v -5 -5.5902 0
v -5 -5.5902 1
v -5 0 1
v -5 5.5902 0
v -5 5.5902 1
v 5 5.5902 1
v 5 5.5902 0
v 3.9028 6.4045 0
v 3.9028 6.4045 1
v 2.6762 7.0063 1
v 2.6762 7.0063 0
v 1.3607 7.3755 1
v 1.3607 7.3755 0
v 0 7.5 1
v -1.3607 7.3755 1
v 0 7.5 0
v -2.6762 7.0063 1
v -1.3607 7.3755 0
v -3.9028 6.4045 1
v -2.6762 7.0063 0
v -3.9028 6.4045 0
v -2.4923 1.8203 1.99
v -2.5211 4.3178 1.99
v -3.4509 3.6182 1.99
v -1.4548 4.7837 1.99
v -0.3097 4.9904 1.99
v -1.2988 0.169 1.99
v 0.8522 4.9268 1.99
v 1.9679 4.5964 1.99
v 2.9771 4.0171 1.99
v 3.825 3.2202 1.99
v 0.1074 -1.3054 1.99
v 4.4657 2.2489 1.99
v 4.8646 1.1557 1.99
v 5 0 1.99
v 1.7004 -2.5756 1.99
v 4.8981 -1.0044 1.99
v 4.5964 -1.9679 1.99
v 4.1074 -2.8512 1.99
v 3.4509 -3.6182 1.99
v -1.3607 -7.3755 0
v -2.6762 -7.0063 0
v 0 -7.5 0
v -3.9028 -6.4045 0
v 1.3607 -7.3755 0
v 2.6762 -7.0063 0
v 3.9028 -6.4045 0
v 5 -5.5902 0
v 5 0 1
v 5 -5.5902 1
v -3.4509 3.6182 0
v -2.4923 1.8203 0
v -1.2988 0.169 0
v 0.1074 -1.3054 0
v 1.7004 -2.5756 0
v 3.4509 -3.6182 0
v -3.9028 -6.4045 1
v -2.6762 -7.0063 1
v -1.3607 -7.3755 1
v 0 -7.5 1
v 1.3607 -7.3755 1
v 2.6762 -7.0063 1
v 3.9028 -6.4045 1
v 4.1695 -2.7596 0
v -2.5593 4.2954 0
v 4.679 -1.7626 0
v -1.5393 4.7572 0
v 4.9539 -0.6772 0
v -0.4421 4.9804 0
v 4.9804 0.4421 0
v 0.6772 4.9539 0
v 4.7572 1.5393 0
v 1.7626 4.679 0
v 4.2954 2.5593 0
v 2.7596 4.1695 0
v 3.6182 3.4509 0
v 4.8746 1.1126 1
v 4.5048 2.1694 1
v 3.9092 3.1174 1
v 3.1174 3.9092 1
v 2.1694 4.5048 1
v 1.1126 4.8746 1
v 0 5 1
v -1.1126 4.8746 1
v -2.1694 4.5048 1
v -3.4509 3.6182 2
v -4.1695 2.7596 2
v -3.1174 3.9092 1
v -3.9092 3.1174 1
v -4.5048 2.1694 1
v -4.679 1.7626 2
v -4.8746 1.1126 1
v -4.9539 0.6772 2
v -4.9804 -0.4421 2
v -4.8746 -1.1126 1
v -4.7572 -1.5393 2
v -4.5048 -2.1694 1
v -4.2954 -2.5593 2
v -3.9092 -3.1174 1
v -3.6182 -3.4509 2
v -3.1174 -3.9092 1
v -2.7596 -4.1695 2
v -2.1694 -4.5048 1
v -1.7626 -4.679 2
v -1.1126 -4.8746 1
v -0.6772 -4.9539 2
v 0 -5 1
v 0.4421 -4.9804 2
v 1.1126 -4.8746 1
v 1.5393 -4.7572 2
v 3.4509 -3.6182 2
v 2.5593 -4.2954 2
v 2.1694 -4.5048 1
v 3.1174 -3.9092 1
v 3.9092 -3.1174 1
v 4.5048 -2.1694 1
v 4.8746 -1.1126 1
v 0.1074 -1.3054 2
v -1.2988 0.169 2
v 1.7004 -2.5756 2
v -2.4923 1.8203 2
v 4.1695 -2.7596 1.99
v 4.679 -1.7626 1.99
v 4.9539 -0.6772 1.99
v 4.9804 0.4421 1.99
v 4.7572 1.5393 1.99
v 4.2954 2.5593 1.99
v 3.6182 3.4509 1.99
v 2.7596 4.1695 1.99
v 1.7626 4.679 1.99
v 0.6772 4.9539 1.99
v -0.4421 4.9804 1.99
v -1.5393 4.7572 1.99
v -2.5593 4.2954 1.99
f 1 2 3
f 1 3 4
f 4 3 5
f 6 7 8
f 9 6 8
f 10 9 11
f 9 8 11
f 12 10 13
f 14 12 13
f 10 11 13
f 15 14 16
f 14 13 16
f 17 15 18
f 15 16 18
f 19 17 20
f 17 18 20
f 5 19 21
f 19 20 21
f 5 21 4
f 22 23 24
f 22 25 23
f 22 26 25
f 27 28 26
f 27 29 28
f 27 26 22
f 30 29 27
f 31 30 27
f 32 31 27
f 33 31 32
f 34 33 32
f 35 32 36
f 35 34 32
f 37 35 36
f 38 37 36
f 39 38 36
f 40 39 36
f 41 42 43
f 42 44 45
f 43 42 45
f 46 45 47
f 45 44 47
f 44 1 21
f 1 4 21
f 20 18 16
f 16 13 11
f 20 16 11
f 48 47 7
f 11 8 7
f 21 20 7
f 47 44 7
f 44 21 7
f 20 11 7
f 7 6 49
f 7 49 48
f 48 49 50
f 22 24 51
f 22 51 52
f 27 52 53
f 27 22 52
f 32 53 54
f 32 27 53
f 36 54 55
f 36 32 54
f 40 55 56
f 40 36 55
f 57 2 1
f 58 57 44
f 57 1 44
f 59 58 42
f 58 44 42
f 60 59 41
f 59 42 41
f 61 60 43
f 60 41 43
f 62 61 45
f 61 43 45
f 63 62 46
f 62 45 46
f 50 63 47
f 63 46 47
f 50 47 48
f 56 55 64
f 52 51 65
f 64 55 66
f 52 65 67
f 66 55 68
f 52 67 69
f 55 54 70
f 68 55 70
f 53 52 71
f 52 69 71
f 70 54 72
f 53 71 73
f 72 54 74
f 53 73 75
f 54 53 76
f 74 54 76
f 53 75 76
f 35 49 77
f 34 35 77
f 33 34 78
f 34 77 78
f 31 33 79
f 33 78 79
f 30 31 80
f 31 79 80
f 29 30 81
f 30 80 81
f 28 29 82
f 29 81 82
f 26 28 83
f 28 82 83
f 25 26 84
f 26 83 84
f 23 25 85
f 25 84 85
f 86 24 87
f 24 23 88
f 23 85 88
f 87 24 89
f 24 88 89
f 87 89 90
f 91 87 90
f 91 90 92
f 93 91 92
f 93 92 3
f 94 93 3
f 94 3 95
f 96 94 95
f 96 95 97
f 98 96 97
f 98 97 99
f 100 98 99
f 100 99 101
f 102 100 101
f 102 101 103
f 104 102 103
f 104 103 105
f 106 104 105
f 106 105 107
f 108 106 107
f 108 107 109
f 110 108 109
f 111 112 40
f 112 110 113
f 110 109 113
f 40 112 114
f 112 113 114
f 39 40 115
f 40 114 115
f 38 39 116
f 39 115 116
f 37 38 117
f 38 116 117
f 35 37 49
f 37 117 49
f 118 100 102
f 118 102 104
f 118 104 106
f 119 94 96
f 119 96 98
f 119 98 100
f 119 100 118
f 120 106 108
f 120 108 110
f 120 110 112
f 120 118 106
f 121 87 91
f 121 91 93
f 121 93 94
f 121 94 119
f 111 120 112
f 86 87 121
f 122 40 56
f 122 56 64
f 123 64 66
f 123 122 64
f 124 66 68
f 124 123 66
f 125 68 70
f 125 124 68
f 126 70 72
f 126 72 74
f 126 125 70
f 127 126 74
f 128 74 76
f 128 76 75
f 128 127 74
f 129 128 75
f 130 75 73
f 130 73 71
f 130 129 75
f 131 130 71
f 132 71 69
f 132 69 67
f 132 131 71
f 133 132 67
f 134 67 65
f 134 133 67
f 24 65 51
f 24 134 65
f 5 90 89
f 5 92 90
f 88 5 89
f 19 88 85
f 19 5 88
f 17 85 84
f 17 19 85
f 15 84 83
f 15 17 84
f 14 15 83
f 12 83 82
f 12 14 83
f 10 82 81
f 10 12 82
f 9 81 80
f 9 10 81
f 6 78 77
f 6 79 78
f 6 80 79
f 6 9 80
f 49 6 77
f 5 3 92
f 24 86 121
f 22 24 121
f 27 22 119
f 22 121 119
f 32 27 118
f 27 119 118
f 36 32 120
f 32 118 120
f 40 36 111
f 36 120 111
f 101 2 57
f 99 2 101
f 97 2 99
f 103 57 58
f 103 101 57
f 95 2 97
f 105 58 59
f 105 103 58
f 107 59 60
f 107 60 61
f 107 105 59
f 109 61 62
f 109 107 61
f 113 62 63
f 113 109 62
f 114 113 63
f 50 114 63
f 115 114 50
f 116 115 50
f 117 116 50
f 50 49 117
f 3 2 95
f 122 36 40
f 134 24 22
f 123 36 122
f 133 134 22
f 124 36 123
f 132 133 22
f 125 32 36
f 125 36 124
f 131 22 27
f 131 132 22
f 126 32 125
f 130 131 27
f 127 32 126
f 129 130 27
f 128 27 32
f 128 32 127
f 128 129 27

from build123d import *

# Parameters (mm, degrees)
SKETCH1_R           = 7.5
BOSS_EXTRUDE1_DEPTH = 1
SKETCH2_R           = 5
BOSS_EXTRUDE2_DEPTH = 1
CUT_EXTRUDE2_REACH  = 12.654
SKETCH4_R           = 15
CUT_EXTRUDE3_DEPTH  = 0.01
BOSS_EXTRUDE3_DEPTH = 1.99


with BuildPart() as part:
    # Sketch1 → Boss-Extrude1 (new body)
    with BuildSketch(Plane(origin=(0, 0, 0), x_dir=(0, 1, 0), z_dir=(0, 0, 1))):
        with Locations(Location((0, 0, 0), (0, 0, 270))):
            Circle(SKETCH1_R)
    extrude(amount=BOSS_EXTRUDE1_DEPTH)

    # Sketch2 → Boss-Extrude2 (add)
    with BuildSketch(Plane.XY.offset(1)):
        Circle(SKETCH2_R)
    extrude(amount=BOSS_EXTRUDE2_DEPTH)

    # Sketch3 → Cut-Extrude2 (cut, up to next)
    with BuildSketch(Plane.XY.offset(1), mode=Mode.PRIVATE) as cut_extrude2_sk1:
        with BuildLine():
            ThreePointArc((5, -5.590169944), (7.5, 0), (5, 5.590169944))
            Line((5, 5.590169944), (5, -5.590169944))
        make_face()
    cut_extrude2_tool1 = extrude(cut_extrude2_sk1.sketch, amount=-CUT_EXTRUDE2_REACH, mode=Mode.PRIVATE) & part.part
    # Sketch3 → Cut-Extrude2 (cut, up to next)
    with BuildSketch(Plane.XY.offset(1), mode=Mode.PRIVATE) as cut_extrude2_sk2:
        with BuildLine():
            Line((-5, -5.590169944), (-5, 5.590169944))
            ThreePointArc((-5, 5.590169944), (-7.5, 0), (-5, -5.590169944))
        make_face()
    cut_extrude2_tool2 = extrude(cut_extrude2_sk2.sketch, amount=-CUT_EXTRUDE2_REACH, mode=Mode.PRIVATE) & part.part
    add(cut_extrude2_tool1.solids().sort_by_distance((6.015822, 0, 1))[0], mode=Mode.SUBTRACT)
    add(cut_extrude2_tool2.solids().sort_by_distance((-6.015822, 0, 1))[0], mode=Mode.SUBTRACT)

    # Sketch4 → Cut-Extrude3 (cut)
    with BuildSketch(Plane(origin=(0, 0, 2), x_dir=(0, -1, 0), z_dir=(0, 0, 1))):
        with Locations((-9.760681966, 10.233723054)):
            Circle(SKETCH4_R)
    extrude(amount=-CUT_EXTRUDE3_DEPTH, mode=Mode.SUBTRACT)


with BuildPart() as body_2:
    # Sketch5 → Boss-Extrude3 (new body)
    with BuildSketch(Plane.XY.offset(1.99)):
        with BuildLine():
            ThreePointArc((3.450922204, -3.618167484), (3.618167484, 3.450922204), (-3.450922204, 3.618167484))
            ThreePointArc((-3.450922204, 3.618167484), (-0.620779398, -0.592084645), (3.450922204, -3.618167484))
        make_face()
    extrude(amount=-BOSS_EXTRUDE3_DEPTH)


solid = Compound([part.part, body_2.part])
